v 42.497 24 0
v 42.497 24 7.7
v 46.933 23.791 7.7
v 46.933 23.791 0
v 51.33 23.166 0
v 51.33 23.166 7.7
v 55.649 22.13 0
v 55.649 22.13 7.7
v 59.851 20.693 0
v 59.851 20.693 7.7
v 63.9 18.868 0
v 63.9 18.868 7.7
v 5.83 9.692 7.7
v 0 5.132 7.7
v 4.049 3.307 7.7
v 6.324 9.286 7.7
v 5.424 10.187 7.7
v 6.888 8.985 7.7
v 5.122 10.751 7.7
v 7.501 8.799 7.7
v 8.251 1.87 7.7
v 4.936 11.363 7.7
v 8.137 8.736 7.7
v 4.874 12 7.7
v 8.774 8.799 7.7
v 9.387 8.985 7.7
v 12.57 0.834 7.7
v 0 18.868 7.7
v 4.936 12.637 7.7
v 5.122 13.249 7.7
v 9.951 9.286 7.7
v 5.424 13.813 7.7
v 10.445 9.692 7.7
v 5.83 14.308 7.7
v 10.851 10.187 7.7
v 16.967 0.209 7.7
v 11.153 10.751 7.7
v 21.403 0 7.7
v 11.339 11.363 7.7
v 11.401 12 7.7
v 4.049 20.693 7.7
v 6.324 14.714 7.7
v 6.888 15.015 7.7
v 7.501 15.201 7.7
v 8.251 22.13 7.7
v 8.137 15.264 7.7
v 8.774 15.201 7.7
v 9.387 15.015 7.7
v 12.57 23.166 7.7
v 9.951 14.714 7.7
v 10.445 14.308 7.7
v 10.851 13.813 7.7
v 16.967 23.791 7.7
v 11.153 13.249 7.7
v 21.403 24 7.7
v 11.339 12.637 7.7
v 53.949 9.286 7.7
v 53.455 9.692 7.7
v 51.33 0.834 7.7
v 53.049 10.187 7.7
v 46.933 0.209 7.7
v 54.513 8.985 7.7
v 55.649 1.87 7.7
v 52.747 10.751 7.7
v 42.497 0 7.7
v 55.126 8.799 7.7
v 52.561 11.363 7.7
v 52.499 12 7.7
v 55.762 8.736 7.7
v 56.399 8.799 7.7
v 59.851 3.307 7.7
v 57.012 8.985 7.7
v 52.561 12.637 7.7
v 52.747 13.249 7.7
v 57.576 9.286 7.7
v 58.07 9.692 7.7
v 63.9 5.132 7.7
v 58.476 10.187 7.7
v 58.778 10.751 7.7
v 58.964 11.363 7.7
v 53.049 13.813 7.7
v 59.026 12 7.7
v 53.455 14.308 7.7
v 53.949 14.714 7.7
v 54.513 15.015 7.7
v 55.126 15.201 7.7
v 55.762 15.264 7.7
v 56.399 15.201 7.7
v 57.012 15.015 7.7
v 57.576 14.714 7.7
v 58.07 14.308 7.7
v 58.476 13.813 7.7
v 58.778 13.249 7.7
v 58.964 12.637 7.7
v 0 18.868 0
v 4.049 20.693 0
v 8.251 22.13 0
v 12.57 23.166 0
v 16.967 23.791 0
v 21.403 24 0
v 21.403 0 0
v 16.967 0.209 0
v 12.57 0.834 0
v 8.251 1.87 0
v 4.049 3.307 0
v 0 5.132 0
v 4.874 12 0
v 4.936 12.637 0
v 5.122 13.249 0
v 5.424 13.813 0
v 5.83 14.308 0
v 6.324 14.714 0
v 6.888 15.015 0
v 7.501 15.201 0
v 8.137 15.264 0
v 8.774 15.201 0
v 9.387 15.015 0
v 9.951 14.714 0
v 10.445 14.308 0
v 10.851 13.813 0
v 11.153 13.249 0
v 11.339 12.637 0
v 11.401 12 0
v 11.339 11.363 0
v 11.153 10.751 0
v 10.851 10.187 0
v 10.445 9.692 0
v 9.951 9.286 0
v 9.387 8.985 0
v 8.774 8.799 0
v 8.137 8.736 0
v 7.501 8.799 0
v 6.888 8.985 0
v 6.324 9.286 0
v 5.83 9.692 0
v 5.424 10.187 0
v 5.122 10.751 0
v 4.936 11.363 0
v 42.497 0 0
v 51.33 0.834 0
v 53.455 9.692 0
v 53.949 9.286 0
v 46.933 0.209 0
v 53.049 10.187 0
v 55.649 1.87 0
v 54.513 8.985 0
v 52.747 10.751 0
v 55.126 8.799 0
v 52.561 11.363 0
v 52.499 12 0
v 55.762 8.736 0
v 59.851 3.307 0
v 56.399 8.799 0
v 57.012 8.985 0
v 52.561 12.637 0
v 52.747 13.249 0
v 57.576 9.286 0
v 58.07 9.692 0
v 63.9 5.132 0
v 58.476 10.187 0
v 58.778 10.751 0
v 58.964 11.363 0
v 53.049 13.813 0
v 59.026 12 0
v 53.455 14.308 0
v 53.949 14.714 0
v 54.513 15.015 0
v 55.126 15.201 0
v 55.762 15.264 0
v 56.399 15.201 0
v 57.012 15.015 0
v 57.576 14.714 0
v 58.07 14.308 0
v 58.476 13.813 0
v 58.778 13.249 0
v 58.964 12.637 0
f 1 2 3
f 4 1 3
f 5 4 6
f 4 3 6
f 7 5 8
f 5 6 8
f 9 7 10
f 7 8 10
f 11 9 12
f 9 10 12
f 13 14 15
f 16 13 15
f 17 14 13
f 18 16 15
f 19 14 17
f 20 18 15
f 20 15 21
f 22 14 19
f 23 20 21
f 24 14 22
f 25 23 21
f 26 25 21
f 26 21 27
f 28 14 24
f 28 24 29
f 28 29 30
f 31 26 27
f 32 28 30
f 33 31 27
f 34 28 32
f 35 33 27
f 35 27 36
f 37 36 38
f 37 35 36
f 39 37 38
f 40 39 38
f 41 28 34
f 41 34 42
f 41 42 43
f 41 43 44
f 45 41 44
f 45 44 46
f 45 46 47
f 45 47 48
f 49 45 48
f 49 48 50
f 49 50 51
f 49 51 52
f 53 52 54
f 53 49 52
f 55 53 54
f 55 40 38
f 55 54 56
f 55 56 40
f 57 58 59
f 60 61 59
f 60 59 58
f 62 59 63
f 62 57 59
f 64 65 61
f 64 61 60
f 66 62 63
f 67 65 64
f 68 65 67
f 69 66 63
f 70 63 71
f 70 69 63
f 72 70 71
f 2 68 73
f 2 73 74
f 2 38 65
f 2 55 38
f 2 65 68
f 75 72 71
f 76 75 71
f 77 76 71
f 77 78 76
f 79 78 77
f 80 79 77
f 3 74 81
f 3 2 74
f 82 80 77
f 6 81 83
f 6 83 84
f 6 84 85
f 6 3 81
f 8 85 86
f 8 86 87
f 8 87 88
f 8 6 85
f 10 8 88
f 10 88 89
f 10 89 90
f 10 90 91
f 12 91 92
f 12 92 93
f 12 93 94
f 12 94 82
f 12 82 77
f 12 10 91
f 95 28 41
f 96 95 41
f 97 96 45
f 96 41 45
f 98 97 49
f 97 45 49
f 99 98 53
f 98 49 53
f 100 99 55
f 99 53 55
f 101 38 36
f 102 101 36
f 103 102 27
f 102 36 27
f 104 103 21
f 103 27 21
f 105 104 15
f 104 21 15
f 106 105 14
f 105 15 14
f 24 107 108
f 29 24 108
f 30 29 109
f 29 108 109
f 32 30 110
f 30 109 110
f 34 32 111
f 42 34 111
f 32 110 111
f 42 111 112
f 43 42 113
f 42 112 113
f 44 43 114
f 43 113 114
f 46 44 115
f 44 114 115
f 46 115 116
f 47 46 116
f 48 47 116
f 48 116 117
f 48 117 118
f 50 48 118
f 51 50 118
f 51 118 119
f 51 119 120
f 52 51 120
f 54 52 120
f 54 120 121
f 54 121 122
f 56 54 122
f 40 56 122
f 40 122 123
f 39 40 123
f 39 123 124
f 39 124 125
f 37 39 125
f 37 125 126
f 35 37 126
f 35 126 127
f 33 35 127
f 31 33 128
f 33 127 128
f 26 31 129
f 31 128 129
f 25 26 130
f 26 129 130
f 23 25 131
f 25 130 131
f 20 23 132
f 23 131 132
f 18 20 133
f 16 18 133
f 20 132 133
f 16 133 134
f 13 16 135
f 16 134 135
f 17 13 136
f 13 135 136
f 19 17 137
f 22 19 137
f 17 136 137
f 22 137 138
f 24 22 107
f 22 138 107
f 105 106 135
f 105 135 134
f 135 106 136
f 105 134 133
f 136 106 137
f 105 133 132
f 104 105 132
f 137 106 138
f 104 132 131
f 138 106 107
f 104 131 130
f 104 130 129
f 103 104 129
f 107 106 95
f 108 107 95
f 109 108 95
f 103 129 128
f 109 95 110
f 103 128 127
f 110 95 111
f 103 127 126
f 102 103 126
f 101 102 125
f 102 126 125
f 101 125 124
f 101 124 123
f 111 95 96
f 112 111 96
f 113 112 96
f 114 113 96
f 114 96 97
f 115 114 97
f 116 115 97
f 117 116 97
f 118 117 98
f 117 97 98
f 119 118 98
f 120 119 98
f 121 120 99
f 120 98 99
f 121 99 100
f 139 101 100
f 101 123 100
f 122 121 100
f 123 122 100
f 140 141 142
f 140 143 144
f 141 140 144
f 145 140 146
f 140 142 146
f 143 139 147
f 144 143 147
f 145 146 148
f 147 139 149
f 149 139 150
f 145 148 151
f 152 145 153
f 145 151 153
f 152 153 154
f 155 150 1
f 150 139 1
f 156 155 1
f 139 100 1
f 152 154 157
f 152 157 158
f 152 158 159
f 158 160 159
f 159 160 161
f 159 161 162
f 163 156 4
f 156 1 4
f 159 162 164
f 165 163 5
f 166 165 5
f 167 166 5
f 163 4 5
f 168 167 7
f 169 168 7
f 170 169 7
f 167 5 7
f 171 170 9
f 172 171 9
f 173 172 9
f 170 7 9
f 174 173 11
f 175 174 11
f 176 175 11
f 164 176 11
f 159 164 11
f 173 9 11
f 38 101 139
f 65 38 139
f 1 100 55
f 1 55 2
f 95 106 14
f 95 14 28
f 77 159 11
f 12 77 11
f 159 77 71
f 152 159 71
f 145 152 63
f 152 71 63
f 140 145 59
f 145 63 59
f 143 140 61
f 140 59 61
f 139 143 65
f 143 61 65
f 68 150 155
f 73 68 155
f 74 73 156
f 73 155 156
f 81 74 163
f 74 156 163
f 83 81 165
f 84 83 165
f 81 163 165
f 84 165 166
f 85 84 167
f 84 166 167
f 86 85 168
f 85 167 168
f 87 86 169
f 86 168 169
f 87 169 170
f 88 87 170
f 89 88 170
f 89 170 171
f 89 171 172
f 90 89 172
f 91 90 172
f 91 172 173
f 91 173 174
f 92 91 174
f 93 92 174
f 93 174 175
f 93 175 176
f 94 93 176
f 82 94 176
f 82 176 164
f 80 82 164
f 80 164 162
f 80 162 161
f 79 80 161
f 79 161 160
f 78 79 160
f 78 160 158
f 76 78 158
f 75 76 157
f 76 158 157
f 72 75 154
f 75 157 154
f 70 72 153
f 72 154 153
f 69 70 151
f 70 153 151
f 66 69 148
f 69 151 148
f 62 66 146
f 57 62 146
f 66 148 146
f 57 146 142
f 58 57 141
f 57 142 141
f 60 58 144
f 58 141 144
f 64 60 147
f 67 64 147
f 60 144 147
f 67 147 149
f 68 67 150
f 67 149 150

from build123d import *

# Parameters (mm, degrees)
SKETCH1_W                = 63.9
SKETCH1_H                = 24
BOSS_EXTRUDE1_DEPTH      = 7.7
F_5_16_18_TAPPED_HOLE1_D = 6.5278
CUT_EXTRUDE1_DEPTH       = 69.69133861


with BuildPart() as part:
    # Sketch1 → Boss-Extrude1 (new body)
    with BuildSketch(Plane.XY):
        with Locations((31.95, 12)):
            Rectangle(SKETCH1_W, SKETCH1_H)
    extrude(amount=BOSS_EXTRUDE1_DEPTH)

    # 5/16-18 Tapped Hole1 (through all)
    with Locations(Plane(origin=(8.1375, 12, 7.7), x_dir=(1, 0, 0), z_dir=(0, 0, 1))):
        with Locations((0, 0), (47.625, 0)):
            Hole(F_5_16_18_TAPPED_HOLE1_D / 2)

    # Sketch4 → Cut-Extrude1 (cut, through all)
    with BuildSketch(Plane.XY.offset(7.7)):
        with BuildLine():
            ThreePointArc((0, 18.867585454), (10.39806648, 22.698962504), (21.402908053, 24))
            Line((21.402908053, 24), (0, 24))
            Line((0, 24), (0, 18.867585454))
        make_face()
        with BuildLine():
            Line((0, 0), (21.402908053, 0))
            ThreePointArc((21.402908053, 0), (10.39806648, 1.301037496), (0, 5.132414546))
            Line((0, 5.132414546), (0, 0))
        make_face()
        with BuildLine():
            Line((63.9, 0), (63.9, 5.132414546))
            ThreePointArc((63.9, 5.132414546), (53.50193352, 1.301037496), (42.497091947, 0))
            Line((42.497091947, 0), (63.9, 0))
        make_face()
        with BuildLine():
            Line((63.9, 18.867585454), (63.9, 24))
            Line((63.9, 24), (42.497091947, 24))
            ThreePointArc((42.497091947, 24), (53.50193352, 22.698962504), (63.9, 18.867585454))
        make_face()
    extrude(amount=-CUT_EXTRUDE1_DEPTH, mode=Mode.SUBTRACT)


solid = part.part
